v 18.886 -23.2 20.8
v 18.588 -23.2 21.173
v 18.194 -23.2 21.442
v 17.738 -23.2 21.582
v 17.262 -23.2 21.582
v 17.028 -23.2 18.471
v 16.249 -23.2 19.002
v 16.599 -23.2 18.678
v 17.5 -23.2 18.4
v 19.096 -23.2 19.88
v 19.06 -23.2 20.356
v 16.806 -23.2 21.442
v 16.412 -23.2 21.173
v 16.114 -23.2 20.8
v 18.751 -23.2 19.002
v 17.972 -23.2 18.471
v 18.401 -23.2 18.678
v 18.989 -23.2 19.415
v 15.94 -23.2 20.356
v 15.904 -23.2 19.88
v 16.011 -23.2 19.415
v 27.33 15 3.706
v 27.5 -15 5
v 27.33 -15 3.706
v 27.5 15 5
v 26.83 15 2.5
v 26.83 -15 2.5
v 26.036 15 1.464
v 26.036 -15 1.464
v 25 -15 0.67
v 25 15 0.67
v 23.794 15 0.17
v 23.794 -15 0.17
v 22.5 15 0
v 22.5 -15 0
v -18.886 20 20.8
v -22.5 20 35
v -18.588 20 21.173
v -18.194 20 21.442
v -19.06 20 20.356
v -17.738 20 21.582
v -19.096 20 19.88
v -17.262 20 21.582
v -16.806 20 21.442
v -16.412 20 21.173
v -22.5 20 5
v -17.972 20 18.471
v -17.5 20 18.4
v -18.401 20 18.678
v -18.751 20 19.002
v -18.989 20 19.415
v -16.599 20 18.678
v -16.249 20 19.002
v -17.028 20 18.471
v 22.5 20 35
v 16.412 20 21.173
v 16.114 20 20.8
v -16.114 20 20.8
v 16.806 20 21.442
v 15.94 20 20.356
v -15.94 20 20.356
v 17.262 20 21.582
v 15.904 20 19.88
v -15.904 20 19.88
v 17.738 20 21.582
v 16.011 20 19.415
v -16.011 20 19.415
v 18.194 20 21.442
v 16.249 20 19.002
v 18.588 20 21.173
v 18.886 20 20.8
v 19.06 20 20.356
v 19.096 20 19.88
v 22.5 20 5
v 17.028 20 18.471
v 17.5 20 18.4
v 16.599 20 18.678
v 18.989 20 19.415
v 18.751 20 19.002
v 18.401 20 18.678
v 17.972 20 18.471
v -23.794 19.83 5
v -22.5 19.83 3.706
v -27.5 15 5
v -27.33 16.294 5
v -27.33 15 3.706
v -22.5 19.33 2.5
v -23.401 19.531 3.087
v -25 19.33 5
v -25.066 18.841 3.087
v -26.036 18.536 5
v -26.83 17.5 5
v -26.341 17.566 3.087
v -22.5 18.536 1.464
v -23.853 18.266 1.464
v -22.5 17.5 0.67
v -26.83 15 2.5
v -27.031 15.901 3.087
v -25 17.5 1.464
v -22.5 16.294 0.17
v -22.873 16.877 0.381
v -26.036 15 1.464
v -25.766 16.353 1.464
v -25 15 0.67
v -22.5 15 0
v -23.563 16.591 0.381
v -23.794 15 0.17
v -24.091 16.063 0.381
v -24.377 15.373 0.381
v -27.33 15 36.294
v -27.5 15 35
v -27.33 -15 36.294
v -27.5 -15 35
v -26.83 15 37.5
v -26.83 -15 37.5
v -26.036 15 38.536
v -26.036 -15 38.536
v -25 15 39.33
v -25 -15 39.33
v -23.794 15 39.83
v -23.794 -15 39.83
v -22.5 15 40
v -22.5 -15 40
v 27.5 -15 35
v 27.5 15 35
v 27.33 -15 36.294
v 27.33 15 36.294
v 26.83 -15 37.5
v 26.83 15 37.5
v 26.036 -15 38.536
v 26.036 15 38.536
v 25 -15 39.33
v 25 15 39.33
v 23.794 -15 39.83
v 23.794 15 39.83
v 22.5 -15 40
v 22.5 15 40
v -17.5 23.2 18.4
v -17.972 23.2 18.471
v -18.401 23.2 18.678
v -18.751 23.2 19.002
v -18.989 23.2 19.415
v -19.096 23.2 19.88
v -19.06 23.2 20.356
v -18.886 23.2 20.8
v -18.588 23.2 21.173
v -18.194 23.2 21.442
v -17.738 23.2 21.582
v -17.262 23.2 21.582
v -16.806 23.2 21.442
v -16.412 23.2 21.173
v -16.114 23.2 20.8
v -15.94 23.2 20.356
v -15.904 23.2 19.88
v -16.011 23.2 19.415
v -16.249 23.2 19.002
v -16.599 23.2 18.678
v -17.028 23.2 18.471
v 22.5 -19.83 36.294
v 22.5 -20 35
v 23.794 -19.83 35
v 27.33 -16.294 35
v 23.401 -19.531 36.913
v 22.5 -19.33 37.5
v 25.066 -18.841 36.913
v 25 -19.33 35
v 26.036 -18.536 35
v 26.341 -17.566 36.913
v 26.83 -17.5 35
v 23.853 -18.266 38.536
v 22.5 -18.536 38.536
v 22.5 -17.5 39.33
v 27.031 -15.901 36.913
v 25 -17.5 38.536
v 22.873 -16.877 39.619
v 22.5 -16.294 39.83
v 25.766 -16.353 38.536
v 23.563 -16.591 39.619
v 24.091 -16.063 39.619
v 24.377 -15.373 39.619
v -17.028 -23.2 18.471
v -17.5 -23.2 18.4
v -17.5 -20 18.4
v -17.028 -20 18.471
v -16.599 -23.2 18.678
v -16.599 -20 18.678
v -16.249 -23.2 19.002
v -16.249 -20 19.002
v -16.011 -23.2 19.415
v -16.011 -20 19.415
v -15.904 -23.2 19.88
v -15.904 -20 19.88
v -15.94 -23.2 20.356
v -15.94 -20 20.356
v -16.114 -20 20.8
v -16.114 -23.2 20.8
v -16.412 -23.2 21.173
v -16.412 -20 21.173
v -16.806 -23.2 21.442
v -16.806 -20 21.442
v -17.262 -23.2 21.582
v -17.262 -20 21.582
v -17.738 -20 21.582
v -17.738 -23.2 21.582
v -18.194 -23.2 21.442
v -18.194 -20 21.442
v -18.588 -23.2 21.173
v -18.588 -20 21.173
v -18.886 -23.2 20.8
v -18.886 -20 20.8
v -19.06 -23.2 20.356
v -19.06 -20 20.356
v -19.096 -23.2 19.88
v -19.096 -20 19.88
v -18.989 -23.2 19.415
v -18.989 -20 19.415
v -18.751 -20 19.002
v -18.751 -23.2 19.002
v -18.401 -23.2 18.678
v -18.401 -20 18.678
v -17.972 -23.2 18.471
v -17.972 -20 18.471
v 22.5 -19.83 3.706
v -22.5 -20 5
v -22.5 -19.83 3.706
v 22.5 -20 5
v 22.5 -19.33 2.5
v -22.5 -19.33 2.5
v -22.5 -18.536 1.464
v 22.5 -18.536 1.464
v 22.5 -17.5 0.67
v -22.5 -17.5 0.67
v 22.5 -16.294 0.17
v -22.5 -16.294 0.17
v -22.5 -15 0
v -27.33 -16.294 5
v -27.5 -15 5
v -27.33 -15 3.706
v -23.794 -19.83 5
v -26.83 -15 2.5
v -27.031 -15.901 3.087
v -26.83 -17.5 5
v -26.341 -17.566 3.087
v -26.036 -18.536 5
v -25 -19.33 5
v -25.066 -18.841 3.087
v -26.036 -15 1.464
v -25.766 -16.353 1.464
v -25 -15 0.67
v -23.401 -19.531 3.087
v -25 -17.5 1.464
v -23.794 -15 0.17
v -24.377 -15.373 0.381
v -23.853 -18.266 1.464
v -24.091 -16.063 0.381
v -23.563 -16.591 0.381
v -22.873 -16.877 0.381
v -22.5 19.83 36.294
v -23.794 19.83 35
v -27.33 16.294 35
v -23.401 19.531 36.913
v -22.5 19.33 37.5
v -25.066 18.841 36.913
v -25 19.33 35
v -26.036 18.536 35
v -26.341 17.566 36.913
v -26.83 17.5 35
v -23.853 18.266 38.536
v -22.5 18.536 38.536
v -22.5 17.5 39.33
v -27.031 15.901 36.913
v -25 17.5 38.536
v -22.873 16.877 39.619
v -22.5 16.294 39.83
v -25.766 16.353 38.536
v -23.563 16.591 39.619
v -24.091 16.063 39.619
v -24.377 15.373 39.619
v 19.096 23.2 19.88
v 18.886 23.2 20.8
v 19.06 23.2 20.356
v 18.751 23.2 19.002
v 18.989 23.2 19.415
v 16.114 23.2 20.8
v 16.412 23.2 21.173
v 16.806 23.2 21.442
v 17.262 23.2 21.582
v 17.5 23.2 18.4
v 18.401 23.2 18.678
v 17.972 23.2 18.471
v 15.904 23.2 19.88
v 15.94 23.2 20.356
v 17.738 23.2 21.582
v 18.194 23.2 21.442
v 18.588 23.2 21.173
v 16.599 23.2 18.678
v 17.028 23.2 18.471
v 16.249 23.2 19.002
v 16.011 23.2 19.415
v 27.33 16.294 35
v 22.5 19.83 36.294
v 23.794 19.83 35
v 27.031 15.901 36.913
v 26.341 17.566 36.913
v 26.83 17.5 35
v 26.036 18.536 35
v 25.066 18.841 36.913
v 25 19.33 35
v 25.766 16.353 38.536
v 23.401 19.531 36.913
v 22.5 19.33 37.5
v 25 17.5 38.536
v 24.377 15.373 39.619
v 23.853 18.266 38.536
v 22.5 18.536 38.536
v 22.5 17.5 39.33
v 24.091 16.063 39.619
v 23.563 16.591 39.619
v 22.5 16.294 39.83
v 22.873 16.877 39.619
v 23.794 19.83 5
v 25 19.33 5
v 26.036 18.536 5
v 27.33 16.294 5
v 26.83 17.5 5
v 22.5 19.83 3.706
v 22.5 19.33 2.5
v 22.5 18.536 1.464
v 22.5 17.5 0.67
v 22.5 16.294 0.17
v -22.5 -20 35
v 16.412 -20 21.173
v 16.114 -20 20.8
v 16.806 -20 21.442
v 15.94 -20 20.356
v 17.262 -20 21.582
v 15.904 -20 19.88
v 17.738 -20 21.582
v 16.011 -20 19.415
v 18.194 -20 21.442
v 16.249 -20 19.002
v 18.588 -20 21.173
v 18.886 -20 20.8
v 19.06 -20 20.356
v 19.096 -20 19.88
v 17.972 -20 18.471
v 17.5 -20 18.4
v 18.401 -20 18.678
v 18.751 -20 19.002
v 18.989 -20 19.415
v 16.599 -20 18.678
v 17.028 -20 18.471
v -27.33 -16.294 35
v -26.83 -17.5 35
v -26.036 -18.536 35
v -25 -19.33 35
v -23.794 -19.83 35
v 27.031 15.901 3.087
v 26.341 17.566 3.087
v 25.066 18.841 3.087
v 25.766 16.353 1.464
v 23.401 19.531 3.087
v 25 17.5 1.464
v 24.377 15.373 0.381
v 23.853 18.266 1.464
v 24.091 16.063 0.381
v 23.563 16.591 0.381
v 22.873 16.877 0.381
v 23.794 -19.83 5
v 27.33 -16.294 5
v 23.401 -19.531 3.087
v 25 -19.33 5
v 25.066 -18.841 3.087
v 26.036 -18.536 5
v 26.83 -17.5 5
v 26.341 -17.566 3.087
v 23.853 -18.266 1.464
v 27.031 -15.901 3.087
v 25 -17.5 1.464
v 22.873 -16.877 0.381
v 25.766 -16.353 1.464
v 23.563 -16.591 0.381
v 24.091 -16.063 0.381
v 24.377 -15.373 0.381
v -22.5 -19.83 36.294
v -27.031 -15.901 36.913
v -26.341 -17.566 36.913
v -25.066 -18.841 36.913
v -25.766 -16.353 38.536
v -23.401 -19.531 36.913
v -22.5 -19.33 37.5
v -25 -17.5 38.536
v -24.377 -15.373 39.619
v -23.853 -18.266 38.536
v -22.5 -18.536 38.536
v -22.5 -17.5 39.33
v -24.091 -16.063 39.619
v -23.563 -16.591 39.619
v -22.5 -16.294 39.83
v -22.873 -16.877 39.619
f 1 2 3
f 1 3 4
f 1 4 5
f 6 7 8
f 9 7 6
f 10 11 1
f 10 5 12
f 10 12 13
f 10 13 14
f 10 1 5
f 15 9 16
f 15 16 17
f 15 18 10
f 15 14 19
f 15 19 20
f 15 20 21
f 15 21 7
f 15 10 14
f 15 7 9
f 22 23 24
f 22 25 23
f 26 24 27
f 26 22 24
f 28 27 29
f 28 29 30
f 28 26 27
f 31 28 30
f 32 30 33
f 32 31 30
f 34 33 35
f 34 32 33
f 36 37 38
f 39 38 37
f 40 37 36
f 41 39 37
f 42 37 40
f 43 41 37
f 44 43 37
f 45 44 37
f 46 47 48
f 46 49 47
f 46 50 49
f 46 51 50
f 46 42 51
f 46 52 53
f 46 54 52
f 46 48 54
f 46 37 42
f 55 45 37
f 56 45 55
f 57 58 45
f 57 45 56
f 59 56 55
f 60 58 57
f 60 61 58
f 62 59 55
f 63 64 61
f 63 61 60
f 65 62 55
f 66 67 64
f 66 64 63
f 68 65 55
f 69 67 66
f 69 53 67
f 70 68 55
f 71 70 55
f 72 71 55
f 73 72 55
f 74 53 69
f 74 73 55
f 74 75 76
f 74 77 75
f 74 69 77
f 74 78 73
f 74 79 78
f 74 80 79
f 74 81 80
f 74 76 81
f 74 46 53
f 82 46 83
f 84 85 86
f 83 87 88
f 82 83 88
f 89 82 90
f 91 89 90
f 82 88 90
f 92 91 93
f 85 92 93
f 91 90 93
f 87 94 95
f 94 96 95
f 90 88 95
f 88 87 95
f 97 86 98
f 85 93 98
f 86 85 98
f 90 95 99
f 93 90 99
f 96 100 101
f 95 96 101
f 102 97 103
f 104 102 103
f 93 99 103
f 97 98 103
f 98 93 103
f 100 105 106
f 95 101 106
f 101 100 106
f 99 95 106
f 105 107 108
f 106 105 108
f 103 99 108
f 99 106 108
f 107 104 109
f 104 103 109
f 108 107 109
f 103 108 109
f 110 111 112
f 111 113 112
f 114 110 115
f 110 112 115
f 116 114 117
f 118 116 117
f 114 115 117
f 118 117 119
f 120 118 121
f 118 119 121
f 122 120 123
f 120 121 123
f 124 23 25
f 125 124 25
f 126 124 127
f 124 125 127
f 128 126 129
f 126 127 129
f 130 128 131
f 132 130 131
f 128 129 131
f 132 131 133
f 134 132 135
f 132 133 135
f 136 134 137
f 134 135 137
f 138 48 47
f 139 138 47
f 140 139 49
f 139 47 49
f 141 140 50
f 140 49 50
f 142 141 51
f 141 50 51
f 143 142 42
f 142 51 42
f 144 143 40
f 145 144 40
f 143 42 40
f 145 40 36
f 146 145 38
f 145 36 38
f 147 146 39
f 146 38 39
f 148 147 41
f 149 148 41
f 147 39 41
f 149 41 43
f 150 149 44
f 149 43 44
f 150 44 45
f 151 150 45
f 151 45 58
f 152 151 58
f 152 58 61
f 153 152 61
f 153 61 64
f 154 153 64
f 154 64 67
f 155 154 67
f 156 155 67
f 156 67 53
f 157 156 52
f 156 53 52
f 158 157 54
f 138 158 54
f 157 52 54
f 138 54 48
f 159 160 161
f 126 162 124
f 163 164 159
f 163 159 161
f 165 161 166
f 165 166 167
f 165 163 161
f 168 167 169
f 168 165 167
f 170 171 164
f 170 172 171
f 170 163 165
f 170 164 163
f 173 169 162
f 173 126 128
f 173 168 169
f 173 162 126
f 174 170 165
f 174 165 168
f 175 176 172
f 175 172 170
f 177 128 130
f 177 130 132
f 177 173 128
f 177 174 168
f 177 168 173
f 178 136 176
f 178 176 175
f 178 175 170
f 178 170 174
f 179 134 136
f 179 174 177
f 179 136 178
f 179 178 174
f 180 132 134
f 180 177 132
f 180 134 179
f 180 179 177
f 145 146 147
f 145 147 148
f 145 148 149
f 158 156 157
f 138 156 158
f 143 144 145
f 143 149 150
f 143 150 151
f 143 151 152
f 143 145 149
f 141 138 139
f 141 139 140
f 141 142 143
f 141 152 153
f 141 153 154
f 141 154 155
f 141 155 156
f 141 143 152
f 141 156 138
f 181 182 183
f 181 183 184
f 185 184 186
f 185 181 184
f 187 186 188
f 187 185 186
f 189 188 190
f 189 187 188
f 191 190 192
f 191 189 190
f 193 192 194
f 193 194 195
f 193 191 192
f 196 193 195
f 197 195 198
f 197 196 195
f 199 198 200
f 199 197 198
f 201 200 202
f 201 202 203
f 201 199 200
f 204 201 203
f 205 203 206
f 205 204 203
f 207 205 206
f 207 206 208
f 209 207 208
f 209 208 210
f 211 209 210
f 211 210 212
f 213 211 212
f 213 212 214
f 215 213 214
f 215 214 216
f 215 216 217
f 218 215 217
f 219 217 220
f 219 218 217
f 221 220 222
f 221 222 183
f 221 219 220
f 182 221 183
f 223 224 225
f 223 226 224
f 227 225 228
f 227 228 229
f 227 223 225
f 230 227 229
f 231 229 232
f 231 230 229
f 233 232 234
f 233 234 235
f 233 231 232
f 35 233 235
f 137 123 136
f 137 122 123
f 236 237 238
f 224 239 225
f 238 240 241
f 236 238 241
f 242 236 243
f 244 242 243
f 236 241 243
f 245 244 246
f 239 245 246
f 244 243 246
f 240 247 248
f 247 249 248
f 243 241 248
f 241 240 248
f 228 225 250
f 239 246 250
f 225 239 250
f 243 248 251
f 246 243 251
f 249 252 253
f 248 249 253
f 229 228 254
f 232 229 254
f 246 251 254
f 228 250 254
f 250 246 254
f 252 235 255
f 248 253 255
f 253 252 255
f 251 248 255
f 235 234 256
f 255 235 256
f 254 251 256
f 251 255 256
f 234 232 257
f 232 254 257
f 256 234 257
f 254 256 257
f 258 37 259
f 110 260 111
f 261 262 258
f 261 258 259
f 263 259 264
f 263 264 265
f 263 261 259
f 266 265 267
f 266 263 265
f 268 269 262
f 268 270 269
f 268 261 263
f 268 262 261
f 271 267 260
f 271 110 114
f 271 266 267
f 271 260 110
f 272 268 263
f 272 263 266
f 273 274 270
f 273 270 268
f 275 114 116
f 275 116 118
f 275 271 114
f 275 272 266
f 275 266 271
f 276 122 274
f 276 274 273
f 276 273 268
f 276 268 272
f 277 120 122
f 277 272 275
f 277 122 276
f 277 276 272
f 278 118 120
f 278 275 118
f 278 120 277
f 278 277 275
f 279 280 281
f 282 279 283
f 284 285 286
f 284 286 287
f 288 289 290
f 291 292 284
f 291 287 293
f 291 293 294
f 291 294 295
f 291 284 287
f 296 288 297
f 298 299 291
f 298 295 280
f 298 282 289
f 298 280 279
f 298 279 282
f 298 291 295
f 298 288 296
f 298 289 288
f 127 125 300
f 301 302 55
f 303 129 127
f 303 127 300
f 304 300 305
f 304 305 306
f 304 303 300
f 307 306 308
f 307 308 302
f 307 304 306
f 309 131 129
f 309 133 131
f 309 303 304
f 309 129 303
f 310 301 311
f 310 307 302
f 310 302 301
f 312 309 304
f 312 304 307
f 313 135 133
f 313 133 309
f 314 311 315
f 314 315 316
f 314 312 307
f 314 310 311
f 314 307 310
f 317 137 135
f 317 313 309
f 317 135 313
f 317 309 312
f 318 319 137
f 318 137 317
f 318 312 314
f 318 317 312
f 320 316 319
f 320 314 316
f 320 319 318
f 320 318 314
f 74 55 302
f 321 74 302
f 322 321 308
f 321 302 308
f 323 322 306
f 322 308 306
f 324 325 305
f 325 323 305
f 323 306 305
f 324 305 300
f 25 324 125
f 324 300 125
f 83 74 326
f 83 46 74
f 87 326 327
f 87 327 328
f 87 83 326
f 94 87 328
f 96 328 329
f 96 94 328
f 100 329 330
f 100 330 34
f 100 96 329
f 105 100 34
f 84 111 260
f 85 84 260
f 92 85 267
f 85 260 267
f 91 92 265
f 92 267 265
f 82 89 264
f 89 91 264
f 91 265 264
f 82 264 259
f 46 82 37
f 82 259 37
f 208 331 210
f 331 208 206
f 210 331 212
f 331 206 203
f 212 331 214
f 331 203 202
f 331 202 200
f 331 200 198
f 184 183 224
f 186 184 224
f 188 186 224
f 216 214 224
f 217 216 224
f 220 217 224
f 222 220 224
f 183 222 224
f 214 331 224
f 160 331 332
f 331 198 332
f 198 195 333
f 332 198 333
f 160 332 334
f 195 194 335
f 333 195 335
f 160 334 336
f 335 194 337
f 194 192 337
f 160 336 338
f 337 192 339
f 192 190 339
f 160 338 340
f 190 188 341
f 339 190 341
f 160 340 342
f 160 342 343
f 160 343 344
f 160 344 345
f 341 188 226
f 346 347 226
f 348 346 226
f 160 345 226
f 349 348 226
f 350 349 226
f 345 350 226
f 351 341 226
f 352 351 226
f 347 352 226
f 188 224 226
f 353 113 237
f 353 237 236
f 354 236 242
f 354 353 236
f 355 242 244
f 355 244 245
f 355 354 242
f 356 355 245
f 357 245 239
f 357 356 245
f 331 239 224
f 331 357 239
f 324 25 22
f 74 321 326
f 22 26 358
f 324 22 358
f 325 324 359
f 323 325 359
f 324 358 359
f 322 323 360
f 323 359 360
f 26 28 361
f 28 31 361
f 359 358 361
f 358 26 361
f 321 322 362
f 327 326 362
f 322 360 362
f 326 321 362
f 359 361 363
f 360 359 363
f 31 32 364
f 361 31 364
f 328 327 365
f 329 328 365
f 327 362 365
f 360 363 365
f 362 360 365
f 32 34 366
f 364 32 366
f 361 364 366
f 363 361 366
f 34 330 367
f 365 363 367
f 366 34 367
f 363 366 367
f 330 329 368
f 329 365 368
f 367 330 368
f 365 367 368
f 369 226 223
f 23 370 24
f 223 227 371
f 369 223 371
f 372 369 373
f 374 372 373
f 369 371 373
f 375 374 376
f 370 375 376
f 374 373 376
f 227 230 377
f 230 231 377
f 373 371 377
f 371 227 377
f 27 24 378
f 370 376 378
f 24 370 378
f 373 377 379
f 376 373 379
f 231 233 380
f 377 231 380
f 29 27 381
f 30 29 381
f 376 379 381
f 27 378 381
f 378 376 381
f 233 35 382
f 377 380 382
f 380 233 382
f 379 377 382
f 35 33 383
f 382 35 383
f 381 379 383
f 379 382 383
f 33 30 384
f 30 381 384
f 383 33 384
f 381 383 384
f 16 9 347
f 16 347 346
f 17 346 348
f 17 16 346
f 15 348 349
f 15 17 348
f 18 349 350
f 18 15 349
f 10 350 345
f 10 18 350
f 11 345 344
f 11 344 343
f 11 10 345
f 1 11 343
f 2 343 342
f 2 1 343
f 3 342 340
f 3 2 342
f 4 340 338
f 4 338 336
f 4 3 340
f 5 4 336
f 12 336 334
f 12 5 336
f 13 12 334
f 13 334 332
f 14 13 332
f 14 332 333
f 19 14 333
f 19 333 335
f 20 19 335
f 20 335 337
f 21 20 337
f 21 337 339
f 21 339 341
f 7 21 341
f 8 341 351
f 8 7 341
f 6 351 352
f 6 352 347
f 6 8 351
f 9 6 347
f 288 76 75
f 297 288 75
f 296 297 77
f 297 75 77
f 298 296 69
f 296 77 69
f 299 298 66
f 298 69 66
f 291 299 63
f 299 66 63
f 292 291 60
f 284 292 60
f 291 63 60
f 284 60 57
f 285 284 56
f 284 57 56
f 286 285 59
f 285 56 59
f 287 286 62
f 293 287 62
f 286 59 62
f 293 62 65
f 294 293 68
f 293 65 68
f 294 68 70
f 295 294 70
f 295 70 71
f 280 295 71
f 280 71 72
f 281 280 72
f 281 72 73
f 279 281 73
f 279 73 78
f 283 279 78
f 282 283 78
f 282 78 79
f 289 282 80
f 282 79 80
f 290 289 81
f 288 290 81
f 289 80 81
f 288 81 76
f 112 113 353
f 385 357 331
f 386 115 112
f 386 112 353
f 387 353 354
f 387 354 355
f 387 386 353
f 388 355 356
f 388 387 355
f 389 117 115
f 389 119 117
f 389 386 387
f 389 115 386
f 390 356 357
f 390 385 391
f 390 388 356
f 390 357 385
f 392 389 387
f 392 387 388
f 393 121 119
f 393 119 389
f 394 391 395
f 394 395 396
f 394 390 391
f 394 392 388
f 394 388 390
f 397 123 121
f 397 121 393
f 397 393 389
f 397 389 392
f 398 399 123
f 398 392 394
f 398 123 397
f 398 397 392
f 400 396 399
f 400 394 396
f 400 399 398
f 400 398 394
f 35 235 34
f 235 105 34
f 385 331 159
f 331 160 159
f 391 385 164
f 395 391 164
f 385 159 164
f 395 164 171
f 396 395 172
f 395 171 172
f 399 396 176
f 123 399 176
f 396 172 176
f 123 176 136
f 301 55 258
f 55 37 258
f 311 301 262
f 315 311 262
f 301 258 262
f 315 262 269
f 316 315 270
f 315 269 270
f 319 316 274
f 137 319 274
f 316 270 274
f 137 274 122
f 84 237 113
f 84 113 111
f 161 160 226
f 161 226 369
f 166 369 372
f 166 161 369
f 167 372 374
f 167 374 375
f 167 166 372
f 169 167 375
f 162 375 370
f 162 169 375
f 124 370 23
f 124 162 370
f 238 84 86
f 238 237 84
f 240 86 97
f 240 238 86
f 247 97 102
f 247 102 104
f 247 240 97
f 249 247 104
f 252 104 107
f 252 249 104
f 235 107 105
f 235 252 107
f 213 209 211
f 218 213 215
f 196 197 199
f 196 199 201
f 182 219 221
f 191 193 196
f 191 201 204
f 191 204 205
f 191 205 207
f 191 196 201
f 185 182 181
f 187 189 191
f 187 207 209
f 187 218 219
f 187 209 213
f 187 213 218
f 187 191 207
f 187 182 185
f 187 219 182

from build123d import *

# Parameters (mm, degrees)
SKETCH1_W           = 55
SKETCH1_H           = 40
BOSS_EXTRUDE1_DEPTH = 40
SKETCH2_R           = 1.6
BOSS_EXTRUDE2_DEPTH = 3.2
BOSS_EXTRUDE3_START = 3.2
SKETCH3_R           = 1.6
BOSS_EXTRUDE3_DEPTH = 3.2
FILLET2_R           = 5
FILLET3_R           = 5
FILLET4_R           = 5
FILLET5_R           = 5


with BuildPart() as part:
    # Sketch1 → Boss-Extrude1 (new body)
    with BuildSketch(Plane.XY):
        Rectangle(SKETCH1_W, SKETCH1_H)
    extrude(amount=BOSS_EXTRUDE1_DEPTH)

    # Sketch2 → Boss-Extrude2 (add)
    with BuildSketch(Plane(origin=(0, 20, 0), x_dir=(1, 0, 0), z_dir=(0, 1, 0))):
        with Locations(Location((-17.5, -20, 0), (0, 0, 90))):
            Circle(SKETCH2_R)
        with Locations(Location((17.5, -20, 0), (0, 0, 90))):
            Circle(SKETCH2_R)
    extrude(amount=BOSS_EXTRUDE2_DEPTH)

    # Sketch3 → Boss-Extrude3 (add)
    with BuildSketch(Plane.XZ.offset(20).offset(BOSS_EXTRUDE3_START)):
        with Locations(Location((-17.5, 20, 0), (0, 0, 270))):
            Circle(SKETCH3_R)
        with Locations(Location((17.5, 20, 0), (0, 0, 270))):
            Circle(SKETCH3_R)
    extrude(amount=-BOSS_EXTRUDE3_DEPTH)

    # Fillet2
    fillet2_edges = [part.edges().sort_by_distance(p)[0] for p in [
        (-27.5, -20, 20),
        (-27.5, 20, 20),
    ]]
    fillet(fillet2_edges, radius=FILLET2_R)

    # Fillet3
    fillet3_edges = [part.edges().sort_by_distance(p)[0] for p in [
        (27.5, -20, 20),
        (27.5, 20, 20),
    ]]
    fillet(fillet3_edges, radius=FILLET3_R)

    # Fillet4
    fillet4_edges = [part.edges().sort_by_distance(p)[0] for p in [
        (0, -20, 40),
        (-27.5, 0, 40),
        (-26.035533906, 18.535533906, 40),
        (-26.035533906, -18.535533906, 40),
        (27.5, 0, 40),
        (0, 20, 40),
        (26.035533906, 18.535533906, 40),
        (26.035533906, -18.535533906, 40),
    ]]
    fillet(fillet4_edges, radius=FILLET4_R)

    # Fillet5
    fillet5_edges = [part.edges().sort_by_distance(p)[0] for p in [
        (0, -20, 0),
        (-27.5, 0, 0),
        (-26.035533906, 18.535533906, 0),
        (-26.035533906, -18.535533906, 0),
        (27.5, 0, 0),
        (0, 20, 0),
        (26.035533906, 18.535533906, 0),
        (26.035533906, -18.535533906, 0),
    ]]
    fillet(fillet5_edges, radius=FILLET5_R)


solid = part.part
